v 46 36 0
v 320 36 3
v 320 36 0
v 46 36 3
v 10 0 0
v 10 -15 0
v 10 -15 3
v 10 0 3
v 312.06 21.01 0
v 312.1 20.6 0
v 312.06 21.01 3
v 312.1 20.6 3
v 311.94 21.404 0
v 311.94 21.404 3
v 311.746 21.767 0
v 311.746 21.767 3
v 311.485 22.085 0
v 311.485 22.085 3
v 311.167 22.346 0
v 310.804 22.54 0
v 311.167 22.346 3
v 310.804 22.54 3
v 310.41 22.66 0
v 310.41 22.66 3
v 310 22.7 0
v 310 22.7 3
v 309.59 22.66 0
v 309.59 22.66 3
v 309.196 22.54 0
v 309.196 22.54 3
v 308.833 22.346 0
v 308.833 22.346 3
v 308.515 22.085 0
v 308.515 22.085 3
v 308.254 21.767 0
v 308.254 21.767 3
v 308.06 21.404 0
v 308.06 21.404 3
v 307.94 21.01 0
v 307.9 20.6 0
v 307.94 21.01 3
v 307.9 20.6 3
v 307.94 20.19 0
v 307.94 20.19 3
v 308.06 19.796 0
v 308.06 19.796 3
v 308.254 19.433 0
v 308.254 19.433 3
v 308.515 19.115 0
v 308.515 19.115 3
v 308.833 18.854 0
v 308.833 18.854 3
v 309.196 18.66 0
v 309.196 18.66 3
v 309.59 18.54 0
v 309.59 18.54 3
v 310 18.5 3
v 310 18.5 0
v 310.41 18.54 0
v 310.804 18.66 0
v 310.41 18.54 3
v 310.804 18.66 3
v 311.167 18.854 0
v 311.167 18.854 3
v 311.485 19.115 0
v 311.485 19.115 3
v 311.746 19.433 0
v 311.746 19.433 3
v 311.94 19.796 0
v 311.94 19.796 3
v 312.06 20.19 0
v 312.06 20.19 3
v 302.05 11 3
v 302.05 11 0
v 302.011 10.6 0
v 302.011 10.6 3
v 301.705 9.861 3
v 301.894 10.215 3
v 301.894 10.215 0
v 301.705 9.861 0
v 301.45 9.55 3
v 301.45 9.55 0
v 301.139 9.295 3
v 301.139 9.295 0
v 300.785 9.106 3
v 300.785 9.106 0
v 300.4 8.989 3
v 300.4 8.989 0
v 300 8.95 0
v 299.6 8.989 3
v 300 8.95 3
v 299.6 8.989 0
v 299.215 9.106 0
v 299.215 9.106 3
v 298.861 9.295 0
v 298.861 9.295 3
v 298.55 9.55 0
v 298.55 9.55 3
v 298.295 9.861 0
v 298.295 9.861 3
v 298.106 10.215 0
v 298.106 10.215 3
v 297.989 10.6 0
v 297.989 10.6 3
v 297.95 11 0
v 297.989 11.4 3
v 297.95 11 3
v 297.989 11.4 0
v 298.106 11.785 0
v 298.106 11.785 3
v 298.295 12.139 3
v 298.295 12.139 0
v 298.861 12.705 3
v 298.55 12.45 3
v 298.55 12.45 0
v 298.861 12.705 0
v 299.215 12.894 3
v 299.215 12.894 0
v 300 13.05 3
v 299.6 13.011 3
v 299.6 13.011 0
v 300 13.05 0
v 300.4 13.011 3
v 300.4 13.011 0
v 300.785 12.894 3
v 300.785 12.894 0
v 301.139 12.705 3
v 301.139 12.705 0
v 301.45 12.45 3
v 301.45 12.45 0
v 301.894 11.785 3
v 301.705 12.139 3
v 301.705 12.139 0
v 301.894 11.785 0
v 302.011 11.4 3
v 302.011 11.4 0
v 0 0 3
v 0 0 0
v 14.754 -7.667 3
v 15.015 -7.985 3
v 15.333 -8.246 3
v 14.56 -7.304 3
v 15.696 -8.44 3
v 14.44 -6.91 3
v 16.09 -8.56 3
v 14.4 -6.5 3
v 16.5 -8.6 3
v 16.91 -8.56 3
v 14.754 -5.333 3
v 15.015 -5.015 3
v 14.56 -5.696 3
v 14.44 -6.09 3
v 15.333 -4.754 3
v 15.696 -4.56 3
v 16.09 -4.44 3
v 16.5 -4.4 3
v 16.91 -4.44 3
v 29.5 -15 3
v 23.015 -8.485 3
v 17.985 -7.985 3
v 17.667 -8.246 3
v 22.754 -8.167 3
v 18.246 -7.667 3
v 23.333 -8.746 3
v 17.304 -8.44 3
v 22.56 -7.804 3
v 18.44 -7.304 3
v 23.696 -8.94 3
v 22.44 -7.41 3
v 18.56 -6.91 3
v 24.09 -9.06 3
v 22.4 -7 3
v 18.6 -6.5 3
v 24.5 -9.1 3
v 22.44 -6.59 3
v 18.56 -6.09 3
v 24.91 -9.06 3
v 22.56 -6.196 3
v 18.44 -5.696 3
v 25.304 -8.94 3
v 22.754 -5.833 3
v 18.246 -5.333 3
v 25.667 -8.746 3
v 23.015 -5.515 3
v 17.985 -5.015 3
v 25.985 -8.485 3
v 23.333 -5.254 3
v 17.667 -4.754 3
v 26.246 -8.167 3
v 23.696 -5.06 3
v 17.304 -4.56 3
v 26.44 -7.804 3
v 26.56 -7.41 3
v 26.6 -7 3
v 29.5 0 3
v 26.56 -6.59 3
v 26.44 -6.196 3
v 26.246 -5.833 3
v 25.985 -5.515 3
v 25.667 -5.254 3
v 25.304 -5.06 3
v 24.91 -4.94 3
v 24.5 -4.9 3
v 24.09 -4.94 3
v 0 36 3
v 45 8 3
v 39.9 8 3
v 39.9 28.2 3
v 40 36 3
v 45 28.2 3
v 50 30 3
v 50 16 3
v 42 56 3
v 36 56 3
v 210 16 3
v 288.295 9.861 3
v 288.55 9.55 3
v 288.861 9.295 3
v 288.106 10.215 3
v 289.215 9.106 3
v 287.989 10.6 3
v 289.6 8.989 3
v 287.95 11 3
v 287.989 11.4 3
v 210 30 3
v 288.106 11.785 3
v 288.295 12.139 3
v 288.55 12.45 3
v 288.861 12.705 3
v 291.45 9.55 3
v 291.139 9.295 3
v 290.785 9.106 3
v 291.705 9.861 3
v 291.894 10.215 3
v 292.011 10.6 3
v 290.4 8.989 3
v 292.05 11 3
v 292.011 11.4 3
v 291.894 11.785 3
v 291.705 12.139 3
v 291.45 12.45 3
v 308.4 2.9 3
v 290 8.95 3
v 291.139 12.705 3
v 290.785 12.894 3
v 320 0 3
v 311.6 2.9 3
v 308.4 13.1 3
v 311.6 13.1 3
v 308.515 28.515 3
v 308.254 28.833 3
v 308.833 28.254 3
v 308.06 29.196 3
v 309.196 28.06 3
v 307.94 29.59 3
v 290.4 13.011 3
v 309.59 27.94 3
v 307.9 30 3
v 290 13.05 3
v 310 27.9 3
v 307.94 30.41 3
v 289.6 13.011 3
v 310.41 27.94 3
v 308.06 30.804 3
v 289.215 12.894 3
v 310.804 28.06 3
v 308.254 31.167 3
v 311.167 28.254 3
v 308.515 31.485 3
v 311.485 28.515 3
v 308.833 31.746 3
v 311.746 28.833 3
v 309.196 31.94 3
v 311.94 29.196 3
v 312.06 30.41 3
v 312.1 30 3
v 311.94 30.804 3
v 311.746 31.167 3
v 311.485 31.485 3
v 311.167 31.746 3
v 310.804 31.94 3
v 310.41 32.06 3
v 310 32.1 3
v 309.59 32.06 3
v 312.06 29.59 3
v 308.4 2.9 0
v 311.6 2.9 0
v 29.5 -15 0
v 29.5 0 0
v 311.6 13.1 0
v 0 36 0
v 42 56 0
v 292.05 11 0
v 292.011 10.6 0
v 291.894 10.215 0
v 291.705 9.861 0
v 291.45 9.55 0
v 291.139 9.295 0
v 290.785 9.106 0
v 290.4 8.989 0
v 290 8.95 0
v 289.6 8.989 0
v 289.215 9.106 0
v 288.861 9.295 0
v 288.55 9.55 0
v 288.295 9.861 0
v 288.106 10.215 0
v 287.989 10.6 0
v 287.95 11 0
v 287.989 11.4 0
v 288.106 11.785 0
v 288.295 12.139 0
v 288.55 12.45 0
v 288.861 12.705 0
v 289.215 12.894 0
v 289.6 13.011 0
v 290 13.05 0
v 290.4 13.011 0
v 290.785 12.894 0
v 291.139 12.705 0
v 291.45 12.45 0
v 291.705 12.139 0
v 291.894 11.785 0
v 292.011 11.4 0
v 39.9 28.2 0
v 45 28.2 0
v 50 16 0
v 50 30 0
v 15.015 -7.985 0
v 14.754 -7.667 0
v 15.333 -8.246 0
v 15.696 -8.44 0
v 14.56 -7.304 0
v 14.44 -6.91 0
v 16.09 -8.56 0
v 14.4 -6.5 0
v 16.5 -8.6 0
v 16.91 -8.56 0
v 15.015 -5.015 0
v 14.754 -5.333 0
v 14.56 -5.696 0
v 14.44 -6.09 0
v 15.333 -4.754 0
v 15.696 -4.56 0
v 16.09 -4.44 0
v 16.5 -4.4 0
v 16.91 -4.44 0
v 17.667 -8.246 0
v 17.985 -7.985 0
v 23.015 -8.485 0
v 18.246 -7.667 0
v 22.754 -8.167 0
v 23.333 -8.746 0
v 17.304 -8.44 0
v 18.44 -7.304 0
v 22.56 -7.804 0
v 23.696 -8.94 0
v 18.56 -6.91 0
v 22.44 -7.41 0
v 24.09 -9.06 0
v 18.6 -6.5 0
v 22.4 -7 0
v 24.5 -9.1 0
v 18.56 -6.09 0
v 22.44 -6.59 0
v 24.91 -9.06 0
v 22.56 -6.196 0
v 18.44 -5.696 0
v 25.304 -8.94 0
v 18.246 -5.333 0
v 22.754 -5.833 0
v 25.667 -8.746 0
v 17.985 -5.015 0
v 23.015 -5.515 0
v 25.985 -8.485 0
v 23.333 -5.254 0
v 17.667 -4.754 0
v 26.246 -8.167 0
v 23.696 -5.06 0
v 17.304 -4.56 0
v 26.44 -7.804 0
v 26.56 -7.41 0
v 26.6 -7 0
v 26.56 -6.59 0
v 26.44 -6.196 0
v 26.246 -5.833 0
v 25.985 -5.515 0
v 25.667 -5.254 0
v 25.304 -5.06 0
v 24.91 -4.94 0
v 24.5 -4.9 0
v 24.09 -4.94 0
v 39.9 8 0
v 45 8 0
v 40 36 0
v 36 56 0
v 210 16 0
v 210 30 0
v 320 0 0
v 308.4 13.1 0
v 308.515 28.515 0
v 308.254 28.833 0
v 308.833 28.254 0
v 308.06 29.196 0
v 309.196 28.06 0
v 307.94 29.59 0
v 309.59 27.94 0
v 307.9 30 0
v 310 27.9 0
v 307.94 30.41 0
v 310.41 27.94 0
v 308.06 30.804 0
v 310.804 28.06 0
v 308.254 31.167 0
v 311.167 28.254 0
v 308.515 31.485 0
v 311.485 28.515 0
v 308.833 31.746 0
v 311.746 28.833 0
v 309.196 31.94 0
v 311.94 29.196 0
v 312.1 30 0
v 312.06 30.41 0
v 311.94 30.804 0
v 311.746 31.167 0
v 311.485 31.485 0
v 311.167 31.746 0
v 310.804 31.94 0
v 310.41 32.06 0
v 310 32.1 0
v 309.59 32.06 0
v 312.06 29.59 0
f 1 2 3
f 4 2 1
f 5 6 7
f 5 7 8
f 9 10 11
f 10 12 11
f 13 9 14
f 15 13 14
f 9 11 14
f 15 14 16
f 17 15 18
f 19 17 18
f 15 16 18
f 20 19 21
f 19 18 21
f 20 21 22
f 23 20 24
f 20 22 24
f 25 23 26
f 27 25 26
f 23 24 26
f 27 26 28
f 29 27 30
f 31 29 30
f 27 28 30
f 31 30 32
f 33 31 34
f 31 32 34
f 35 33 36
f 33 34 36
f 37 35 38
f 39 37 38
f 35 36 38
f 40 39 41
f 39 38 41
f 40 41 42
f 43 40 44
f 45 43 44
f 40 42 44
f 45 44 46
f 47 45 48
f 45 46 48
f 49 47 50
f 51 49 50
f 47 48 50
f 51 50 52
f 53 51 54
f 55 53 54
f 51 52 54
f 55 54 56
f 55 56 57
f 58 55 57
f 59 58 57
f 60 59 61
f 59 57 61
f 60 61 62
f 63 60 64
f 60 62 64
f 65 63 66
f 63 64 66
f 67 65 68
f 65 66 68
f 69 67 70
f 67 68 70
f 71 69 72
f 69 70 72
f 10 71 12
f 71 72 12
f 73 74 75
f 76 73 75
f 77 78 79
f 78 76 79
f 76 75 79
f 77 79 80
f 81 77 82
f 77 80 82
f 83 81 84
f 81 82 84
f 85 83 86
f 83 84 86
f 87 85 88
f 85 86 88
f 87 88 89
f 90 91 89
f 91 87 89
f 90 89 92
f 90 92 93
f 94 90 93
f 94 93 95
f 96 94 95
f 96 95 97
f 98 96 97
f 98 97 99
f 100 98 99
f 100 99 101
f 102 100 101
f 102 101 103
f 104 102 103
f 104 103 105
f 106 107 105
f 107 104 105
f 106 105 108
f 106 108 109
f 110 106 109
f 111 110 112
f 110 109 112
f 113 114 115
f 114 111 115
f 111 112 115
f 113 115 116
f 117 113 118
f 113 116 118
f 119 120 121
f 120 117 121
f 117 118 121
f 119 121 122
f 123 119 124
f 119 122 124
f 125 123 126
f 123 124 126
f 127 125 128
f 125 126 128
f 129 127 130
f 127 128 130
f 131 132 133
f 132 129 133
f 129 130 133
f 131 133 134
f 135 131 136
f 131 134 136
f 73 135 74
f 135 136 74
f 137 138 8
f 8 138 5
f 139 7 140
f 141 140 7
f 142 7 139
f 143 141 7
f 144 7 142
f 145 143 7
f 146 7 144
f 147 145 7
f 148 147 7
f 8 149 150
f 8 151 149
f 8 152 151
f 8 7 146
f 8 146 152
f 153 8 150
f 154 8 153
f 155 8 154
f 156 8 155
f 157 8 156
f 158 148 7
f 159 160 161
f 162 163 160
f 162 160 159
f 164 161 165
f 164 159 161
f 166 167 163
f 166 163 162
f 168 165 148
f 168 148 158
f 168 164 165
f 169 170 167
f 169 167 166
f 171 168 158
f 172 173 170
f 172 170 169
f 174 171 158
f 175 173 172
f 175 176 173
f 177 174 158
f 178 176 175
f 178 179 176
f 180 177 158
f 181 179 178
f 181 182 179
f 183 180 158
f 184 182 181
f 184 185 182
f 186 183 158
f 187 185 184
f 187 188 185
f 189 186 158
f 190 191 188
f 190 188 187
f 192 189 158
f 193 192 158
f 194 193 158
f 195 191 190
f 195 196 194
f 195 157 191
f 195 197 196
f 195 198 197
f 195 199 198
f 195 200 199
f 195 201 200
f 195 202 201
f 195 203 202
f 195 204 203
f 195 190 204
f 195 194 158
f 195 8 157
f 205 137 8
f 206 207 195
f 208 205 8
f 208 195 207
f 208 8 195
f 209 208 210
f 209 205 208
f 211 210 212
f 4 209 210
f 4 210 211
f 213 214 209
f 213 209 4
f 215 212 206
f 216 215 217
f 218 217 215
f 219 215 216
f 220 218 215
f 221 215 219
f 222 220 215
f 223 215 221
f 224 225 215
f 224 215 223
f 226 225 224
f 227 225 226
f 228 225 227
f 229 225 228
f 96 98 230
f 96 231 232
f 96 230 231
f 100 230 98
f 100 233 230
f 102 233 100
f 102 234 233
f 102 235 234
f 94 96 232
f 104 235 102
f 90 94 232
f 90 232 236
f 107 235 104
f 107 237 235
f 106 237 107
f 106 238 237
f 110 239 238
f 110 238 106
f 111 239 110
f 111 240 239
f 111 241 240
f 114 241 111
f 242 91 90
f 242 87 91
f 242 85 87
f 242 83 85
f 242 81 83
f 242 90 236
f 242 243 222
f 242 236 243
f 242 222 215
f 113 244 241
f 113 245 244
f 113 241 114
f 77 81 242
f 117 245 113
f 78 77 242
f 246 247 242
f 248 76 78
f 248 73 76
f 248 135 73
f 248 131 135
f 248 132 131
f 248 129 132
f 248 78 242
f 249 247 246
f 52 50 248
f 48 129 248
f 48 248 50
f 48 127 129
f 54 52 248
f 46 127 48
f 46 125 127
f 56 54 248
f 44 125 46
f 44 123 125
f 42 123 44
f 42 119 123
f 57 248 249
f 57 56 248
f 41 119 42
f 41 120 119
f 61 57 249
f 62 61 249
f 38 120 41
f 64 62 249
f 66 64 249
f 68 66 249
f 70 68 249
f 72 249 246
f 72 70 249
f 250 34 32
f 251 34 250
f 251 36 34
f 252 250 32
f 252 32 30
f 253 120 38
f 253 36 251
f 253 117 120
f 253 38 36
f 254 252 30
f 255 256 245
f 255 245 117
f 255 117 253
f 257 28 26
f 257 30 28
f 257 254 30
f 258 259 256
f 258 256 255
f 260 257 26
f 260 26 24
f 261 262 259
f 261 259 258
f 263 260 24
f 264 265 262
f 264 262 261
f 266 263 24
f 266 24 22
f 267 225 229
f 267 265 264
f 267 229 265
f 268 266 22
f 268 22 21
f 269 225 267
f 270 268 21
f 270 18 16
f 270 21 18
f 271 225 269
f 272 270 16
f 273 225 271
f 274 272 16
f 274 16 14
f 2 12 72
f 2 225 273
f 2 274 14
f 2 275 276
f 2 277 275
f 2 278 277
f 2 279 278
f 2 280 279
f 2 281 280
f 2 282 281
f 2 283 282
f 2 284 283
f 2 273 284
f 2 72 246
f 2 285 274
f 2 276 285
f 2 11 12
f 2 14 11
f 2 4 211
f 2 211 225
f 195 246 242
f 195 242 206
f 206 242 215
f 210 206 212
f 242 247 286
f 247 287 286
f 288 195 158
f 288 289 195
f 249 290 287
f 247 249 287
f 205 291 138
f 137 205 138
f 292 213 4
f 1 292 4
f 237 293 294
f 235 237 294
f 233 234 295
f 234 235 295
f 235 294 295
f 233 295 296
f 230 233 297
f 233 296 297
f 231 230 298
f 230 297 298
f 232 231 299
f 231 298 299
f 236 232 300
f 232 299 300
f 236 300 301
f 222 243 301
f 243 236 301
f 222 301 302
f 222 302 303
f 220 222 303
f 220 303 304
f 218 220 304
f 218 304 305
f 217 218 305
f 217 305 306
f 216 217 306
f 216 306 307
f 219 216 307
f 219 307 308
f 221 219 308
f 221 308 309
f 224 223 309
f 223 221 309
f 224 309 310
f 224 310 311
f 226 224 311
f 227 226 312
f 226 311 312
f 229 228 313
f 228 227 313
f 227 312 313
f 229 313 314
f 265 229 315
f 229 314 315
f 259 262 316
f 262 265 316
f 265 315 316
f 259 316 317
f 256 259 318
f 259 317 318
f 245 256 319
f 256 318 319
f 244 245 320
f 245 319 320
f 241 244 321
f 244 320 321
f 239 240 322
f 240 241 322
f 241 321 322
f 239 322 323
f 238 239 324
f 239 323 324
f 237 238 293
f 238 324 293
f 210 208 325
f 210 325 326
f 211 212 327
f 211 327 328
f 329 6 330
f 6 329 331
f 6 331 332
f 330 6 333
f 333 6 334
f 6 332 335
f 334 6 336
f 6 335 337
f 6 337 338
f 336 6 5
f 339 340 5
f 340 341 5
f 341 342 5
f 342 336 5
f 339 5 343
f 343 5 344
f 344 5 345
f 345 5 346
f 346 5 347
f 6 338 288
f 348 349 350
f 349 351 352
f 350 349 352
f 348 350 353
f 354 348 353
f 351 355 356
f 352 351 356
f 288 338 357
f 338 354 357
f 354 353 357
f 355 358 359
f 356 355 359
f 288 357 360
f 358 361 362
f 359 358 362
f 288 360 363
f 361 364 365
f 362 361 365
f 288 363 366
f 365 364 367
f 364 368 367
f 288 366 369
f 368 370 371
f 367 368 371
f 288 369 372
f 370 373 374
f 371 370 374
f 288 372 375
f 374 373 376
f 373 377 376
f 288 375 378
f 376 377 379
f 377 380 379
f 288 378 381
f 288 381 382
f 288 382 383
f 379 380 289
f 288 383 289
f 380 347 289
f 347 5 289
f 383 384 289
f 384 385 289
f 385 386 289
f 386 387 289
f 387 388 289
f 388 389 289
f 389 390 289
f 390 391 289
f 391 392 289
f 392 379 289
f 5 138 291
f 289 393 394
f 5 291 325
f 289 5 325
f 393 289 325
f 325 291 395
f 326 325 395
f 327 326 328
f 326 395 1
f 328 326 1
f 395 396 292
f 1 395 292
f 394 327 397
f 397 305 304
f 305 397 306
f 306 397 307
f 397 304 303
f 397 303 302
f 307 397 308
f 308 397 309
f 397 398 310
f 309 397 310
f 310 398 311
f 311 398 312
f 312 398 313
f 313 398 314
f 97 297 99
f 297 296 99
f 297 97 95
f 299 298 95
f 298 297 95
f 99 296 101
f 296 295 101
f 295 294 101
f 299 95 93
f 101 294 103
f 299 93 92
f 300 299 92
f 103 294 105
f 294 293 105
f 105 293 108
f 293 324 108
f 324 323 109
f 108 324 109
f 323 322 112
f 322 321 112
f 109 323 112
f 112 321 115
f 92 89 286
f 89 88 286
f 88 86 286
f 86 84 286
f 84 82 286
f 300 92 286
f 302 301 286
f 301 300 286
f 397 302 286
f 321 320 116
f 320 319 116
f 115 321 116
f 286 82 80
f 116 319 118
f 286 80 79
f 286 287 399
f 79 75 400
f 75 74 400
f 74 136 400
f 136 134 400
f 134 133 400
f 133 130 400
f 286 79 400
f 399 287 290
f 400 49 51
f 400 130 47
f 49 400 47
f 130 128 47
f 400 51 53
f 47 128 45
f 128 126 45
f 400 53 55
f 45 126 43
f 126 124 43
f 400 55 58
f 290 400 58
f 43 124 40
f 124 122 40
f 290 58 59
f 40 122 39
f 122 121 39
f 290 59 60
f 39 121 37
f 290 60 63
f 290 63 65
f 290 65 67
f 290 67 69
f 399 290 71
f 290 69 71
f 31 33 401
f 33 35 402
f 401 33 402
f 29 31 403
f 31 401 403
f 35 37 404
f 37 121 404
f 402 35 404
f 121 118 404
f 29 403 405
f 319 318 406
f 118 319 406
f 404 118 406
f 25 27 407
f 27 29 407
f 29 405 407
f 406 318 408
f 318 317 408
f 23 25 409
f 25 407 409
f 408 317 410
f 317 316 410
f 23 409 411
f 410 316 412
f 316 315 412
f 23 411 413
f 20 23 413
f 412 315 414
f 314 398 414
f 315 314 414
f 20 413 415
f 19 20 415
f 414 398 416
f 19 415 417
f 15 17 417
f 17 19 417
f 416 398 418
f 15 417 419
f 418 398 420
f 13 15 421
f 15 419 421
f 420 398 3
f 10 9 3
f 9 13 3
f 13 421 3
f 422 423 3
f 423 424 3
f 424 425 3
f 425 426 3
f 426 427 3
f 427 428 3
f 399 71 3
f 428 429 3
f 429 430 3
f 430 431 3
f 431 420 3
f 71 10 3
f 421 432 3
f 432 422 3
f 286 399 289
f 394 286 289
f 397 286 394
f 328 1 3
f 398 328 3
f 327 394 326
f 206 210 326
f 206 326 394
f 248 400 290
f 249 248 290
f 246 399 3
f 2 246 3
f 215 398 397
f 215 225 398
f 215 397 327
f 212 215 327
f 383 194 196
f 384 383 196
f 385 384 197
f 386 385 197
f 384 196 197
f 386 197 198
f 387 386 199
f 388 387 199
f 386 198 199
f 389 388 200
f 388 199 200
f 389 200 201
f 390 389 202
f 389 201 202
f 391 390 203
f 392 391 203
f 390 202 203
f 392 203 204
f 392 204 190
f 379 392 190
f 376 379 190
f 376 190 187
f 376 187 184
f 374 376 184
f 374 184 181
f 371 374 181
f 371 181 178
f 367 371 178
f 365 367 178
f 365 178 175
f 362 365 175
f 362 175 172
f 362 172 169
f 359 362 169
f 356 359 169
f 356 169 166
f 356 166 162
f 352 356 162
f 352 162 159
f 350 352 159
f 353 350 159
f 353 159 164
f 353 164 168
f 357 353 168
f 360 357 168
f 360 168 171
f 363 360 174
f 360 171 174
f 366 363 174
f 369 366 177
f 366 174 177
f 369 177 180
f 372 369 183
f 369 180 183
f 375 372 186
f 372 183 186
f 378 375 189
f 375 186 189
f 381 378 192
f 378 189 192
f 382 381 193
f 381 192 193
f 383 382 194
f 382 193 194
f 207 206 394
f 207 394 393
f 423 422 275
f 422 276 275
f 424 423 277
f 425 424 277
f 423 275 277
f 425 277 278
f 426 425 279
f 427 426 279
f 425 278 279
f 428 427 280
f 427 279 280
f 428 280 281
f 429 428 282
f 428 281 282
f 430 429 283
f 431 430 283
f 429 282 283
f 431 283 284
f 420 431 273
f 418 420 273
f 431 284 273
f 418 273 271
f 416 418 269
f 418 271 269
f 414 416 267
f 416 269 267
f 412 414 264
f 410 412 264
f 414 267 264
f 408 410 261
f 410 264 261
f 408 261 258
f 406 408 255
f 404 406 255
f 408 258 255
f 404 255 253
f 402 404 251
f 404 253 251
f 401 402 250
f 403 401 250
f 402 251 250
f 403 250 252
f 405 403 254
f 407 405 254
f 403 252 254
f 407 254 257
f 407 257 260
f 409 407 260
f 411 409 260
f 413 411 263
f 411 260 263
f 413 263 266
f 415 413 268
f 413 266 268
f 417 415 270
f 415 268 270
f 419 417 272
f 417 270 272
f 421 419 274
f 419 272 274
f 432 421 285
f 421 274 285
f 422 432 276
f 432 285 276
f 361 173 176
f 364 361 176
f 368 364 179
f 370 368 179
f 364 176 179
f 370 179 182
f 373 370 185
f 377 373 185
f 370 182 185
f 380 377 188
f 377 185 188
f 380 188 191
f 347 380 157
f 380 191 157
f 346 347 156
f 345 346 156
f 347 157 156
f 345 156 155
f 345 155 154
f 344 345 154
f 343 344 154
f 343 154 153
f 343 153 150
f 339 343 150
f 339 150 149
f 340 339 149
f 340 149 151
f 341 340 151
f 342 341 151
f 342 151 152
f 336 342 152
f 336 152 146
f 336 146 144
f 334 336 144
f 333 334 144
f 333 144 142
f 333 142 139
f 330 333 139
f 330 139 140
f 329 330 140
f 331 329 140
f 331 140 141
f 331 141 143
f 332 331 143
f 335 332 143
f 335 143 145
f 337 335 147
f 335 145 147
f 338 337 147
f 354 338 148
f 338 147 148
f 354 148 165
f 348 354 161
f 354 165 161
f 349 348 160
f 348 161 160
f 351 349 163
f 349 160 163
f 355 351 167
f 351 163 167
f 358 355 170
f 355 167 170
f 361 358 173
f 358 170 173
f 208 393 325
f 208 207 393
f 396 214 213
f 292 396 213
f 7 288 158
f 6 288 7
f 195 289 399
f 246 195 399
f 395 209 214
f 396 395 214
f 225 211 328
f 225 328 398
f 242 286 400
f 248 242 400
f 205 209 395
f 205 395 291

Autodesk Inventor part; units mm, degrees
ref_plane "YZ Plane" through (0, 0, 0) normal (1, 0, 0) x (0, 1, 0)
ref_plane "XZ Plane" through (0, 0, 0) normal (0, 1, 0) x (-1, 0, 0)
ref_plane "XY Plane" through (0, 0, 0) normal (0, 0, 1) x (1, 0, 0)
sketch "Sketch1" plane through (0, 0, 0) normal (0, 0, 1) x (1, 0, 0)
  line L0 (0, 0) -> (320, 0)
  line L1 (320, 0) -> (320, 16)
  line L2 (320, 16) -> (0, 16)
  line L3 (0, 16) -> (0, 0)
  line L4 (0, 0) -> (22.0483, 0)
  line L5 (10, 0) -> (29.5, 0)
  line L6 (29.5, 0) -> (29.5, -15)
  line L7 (29.5, -15) -> (10, -15)
  line L8 (10, -15) -> (10, 0)
  line L9 (308.4, 13.1) -> (311.6, 13.1)
  line L10 (311.6, 13.1) -> (311.6, 2.9)
  line L11 (311.6, 2.9) -> (308.4, 2.9)
  line L12 (308.4, 2.9) -> (308.4, 13.1)
  line L13 (308.4, 13.1) -> (311.6, 2.9) construction
  line L14 (311.6, 13.1) -> (308.4, 2.9) construction
  circle A0 centre (300, 11) radius 2.05
  circle A1 centre (290, 11) radius 2.05
  point P0 (0, 8)
  point P1 (310, 8)
  dimension "d2" = 19.5
  dimension "d3" = 15
  dimension "d4" = 10
  dimension "d5" = 16
  dimension "d8" = 320
  dimension "d13" = 10.2
  dimension "d14" = 3.2
  dimension "d15" = 10
  dimension "d16" = 4.1
  dimension "d18" = 4.1
  dimension "d20" = 10
  dimension "d21" = 20
  dimension "d23" = 5
extrude "Extrusion1" add sketch "Sketch1" along normal blind 3
sketch "Sketch2" plane through (0, 0, 3) normal (0, 0, 1) x (1, 0, 0)
  line L0 (0, 16) -> (0, 0) projected
  line L1 (0, 16) -> (0, 36)
  line L2 (320, 0) -> (320, 16) projected
  line L3 (320, 16) -> (320, 36)
  line L4 (320, 36) -> (0, 36)
  line L5 (320, 16) -> (0, 16) projected
  line L6 (50, 16) -> (50, 30)
  line L7 (50, 30) -> (210, 30)
  line L8 (210, 30) -> (210, 16)
  line L9 (40, 36) -> (36, 56)
  line L10 (36, 56) -> (42, 56)
  line L11 (42, 56) -> (46, 36)
  circle A0 centre (300, 11) radius 2.05 projected
  line L12 (311.6, 13.1) -> (311.6, 2.9) projected
  circle A1 centre (310, 30) radius 2.1
  circle A2 centre (310, 20.6) radius 2.1
  point P0 (308.4, 13.1)
  point P1 (311.6, 8)
  dimension "d44" = 20
  dimension "d45" = 160
  dimension "d46" = 50
  dimension "d47" = 14
  dimension "d48" = 20
  dimension "d49" = 6
  dimension "d50" = 4
  dimension "d51" = 40
  dimension "d83" = 4.2
  dimension "d84" = 4.2
  dimension "d85" = 6
  dimension "d86" = 9.4
  dimension "d87" = 10
extrude "Extrusion2" add sketch "Sketch2" against normal blind 3 contours L1 L4 L3 L5 L8 L7 L6 | L9 L10 L11 L4
sketch "Sketch3" plane through (0, 0, 3) normal (0, 0, 1) x (1, 0, 0)
  circle A0 centre (16.5, -6.5) radius 2.1
  circle A1 centre (24.5, -7) radius 2.1
  line L0 (29.5, 0) -> (320, 0) projected
  line L1 (29.5, -15) -> (29.5, 0) projected
  point P0 (0, 0)
  dimension "d75" = 4.2
  dimension "d76" = 6.5
  dimension "d77" = 4.2
  dimension "d78" = 7
  dimension "d79" = 5
  dimension "d80" = 8
extrude "Extrusion3" cut sketch "Sketch3" against normal blind 3
sketch "Sketch4" plane through (0, 0, 3) normal (0, 0, 1) x (1, 0, 0)
  line L0 (39.9, 28.2) -> (45, 28.2)
  line L1 (45, 28.2) -> (45, 8)
  line L2 (45, 8) -> (39.9, 8)
  line L3 (39.9, 8) -> (39.9, 28.2)
  line L4 (50, 16) -> (50, 30) projected
  line L5 (29.5, 0) -> (320, 0) projected
  point P0 (0, 0)
  dimension "d88" = 5.1
  dimension "d89" = 20.2
  dimension "d90" = 5
  dimension "d91" = 8
extrude "Extrusion4" cut sketch "Sketch4" against normal blind 3
properties part number "Middle_bar"
